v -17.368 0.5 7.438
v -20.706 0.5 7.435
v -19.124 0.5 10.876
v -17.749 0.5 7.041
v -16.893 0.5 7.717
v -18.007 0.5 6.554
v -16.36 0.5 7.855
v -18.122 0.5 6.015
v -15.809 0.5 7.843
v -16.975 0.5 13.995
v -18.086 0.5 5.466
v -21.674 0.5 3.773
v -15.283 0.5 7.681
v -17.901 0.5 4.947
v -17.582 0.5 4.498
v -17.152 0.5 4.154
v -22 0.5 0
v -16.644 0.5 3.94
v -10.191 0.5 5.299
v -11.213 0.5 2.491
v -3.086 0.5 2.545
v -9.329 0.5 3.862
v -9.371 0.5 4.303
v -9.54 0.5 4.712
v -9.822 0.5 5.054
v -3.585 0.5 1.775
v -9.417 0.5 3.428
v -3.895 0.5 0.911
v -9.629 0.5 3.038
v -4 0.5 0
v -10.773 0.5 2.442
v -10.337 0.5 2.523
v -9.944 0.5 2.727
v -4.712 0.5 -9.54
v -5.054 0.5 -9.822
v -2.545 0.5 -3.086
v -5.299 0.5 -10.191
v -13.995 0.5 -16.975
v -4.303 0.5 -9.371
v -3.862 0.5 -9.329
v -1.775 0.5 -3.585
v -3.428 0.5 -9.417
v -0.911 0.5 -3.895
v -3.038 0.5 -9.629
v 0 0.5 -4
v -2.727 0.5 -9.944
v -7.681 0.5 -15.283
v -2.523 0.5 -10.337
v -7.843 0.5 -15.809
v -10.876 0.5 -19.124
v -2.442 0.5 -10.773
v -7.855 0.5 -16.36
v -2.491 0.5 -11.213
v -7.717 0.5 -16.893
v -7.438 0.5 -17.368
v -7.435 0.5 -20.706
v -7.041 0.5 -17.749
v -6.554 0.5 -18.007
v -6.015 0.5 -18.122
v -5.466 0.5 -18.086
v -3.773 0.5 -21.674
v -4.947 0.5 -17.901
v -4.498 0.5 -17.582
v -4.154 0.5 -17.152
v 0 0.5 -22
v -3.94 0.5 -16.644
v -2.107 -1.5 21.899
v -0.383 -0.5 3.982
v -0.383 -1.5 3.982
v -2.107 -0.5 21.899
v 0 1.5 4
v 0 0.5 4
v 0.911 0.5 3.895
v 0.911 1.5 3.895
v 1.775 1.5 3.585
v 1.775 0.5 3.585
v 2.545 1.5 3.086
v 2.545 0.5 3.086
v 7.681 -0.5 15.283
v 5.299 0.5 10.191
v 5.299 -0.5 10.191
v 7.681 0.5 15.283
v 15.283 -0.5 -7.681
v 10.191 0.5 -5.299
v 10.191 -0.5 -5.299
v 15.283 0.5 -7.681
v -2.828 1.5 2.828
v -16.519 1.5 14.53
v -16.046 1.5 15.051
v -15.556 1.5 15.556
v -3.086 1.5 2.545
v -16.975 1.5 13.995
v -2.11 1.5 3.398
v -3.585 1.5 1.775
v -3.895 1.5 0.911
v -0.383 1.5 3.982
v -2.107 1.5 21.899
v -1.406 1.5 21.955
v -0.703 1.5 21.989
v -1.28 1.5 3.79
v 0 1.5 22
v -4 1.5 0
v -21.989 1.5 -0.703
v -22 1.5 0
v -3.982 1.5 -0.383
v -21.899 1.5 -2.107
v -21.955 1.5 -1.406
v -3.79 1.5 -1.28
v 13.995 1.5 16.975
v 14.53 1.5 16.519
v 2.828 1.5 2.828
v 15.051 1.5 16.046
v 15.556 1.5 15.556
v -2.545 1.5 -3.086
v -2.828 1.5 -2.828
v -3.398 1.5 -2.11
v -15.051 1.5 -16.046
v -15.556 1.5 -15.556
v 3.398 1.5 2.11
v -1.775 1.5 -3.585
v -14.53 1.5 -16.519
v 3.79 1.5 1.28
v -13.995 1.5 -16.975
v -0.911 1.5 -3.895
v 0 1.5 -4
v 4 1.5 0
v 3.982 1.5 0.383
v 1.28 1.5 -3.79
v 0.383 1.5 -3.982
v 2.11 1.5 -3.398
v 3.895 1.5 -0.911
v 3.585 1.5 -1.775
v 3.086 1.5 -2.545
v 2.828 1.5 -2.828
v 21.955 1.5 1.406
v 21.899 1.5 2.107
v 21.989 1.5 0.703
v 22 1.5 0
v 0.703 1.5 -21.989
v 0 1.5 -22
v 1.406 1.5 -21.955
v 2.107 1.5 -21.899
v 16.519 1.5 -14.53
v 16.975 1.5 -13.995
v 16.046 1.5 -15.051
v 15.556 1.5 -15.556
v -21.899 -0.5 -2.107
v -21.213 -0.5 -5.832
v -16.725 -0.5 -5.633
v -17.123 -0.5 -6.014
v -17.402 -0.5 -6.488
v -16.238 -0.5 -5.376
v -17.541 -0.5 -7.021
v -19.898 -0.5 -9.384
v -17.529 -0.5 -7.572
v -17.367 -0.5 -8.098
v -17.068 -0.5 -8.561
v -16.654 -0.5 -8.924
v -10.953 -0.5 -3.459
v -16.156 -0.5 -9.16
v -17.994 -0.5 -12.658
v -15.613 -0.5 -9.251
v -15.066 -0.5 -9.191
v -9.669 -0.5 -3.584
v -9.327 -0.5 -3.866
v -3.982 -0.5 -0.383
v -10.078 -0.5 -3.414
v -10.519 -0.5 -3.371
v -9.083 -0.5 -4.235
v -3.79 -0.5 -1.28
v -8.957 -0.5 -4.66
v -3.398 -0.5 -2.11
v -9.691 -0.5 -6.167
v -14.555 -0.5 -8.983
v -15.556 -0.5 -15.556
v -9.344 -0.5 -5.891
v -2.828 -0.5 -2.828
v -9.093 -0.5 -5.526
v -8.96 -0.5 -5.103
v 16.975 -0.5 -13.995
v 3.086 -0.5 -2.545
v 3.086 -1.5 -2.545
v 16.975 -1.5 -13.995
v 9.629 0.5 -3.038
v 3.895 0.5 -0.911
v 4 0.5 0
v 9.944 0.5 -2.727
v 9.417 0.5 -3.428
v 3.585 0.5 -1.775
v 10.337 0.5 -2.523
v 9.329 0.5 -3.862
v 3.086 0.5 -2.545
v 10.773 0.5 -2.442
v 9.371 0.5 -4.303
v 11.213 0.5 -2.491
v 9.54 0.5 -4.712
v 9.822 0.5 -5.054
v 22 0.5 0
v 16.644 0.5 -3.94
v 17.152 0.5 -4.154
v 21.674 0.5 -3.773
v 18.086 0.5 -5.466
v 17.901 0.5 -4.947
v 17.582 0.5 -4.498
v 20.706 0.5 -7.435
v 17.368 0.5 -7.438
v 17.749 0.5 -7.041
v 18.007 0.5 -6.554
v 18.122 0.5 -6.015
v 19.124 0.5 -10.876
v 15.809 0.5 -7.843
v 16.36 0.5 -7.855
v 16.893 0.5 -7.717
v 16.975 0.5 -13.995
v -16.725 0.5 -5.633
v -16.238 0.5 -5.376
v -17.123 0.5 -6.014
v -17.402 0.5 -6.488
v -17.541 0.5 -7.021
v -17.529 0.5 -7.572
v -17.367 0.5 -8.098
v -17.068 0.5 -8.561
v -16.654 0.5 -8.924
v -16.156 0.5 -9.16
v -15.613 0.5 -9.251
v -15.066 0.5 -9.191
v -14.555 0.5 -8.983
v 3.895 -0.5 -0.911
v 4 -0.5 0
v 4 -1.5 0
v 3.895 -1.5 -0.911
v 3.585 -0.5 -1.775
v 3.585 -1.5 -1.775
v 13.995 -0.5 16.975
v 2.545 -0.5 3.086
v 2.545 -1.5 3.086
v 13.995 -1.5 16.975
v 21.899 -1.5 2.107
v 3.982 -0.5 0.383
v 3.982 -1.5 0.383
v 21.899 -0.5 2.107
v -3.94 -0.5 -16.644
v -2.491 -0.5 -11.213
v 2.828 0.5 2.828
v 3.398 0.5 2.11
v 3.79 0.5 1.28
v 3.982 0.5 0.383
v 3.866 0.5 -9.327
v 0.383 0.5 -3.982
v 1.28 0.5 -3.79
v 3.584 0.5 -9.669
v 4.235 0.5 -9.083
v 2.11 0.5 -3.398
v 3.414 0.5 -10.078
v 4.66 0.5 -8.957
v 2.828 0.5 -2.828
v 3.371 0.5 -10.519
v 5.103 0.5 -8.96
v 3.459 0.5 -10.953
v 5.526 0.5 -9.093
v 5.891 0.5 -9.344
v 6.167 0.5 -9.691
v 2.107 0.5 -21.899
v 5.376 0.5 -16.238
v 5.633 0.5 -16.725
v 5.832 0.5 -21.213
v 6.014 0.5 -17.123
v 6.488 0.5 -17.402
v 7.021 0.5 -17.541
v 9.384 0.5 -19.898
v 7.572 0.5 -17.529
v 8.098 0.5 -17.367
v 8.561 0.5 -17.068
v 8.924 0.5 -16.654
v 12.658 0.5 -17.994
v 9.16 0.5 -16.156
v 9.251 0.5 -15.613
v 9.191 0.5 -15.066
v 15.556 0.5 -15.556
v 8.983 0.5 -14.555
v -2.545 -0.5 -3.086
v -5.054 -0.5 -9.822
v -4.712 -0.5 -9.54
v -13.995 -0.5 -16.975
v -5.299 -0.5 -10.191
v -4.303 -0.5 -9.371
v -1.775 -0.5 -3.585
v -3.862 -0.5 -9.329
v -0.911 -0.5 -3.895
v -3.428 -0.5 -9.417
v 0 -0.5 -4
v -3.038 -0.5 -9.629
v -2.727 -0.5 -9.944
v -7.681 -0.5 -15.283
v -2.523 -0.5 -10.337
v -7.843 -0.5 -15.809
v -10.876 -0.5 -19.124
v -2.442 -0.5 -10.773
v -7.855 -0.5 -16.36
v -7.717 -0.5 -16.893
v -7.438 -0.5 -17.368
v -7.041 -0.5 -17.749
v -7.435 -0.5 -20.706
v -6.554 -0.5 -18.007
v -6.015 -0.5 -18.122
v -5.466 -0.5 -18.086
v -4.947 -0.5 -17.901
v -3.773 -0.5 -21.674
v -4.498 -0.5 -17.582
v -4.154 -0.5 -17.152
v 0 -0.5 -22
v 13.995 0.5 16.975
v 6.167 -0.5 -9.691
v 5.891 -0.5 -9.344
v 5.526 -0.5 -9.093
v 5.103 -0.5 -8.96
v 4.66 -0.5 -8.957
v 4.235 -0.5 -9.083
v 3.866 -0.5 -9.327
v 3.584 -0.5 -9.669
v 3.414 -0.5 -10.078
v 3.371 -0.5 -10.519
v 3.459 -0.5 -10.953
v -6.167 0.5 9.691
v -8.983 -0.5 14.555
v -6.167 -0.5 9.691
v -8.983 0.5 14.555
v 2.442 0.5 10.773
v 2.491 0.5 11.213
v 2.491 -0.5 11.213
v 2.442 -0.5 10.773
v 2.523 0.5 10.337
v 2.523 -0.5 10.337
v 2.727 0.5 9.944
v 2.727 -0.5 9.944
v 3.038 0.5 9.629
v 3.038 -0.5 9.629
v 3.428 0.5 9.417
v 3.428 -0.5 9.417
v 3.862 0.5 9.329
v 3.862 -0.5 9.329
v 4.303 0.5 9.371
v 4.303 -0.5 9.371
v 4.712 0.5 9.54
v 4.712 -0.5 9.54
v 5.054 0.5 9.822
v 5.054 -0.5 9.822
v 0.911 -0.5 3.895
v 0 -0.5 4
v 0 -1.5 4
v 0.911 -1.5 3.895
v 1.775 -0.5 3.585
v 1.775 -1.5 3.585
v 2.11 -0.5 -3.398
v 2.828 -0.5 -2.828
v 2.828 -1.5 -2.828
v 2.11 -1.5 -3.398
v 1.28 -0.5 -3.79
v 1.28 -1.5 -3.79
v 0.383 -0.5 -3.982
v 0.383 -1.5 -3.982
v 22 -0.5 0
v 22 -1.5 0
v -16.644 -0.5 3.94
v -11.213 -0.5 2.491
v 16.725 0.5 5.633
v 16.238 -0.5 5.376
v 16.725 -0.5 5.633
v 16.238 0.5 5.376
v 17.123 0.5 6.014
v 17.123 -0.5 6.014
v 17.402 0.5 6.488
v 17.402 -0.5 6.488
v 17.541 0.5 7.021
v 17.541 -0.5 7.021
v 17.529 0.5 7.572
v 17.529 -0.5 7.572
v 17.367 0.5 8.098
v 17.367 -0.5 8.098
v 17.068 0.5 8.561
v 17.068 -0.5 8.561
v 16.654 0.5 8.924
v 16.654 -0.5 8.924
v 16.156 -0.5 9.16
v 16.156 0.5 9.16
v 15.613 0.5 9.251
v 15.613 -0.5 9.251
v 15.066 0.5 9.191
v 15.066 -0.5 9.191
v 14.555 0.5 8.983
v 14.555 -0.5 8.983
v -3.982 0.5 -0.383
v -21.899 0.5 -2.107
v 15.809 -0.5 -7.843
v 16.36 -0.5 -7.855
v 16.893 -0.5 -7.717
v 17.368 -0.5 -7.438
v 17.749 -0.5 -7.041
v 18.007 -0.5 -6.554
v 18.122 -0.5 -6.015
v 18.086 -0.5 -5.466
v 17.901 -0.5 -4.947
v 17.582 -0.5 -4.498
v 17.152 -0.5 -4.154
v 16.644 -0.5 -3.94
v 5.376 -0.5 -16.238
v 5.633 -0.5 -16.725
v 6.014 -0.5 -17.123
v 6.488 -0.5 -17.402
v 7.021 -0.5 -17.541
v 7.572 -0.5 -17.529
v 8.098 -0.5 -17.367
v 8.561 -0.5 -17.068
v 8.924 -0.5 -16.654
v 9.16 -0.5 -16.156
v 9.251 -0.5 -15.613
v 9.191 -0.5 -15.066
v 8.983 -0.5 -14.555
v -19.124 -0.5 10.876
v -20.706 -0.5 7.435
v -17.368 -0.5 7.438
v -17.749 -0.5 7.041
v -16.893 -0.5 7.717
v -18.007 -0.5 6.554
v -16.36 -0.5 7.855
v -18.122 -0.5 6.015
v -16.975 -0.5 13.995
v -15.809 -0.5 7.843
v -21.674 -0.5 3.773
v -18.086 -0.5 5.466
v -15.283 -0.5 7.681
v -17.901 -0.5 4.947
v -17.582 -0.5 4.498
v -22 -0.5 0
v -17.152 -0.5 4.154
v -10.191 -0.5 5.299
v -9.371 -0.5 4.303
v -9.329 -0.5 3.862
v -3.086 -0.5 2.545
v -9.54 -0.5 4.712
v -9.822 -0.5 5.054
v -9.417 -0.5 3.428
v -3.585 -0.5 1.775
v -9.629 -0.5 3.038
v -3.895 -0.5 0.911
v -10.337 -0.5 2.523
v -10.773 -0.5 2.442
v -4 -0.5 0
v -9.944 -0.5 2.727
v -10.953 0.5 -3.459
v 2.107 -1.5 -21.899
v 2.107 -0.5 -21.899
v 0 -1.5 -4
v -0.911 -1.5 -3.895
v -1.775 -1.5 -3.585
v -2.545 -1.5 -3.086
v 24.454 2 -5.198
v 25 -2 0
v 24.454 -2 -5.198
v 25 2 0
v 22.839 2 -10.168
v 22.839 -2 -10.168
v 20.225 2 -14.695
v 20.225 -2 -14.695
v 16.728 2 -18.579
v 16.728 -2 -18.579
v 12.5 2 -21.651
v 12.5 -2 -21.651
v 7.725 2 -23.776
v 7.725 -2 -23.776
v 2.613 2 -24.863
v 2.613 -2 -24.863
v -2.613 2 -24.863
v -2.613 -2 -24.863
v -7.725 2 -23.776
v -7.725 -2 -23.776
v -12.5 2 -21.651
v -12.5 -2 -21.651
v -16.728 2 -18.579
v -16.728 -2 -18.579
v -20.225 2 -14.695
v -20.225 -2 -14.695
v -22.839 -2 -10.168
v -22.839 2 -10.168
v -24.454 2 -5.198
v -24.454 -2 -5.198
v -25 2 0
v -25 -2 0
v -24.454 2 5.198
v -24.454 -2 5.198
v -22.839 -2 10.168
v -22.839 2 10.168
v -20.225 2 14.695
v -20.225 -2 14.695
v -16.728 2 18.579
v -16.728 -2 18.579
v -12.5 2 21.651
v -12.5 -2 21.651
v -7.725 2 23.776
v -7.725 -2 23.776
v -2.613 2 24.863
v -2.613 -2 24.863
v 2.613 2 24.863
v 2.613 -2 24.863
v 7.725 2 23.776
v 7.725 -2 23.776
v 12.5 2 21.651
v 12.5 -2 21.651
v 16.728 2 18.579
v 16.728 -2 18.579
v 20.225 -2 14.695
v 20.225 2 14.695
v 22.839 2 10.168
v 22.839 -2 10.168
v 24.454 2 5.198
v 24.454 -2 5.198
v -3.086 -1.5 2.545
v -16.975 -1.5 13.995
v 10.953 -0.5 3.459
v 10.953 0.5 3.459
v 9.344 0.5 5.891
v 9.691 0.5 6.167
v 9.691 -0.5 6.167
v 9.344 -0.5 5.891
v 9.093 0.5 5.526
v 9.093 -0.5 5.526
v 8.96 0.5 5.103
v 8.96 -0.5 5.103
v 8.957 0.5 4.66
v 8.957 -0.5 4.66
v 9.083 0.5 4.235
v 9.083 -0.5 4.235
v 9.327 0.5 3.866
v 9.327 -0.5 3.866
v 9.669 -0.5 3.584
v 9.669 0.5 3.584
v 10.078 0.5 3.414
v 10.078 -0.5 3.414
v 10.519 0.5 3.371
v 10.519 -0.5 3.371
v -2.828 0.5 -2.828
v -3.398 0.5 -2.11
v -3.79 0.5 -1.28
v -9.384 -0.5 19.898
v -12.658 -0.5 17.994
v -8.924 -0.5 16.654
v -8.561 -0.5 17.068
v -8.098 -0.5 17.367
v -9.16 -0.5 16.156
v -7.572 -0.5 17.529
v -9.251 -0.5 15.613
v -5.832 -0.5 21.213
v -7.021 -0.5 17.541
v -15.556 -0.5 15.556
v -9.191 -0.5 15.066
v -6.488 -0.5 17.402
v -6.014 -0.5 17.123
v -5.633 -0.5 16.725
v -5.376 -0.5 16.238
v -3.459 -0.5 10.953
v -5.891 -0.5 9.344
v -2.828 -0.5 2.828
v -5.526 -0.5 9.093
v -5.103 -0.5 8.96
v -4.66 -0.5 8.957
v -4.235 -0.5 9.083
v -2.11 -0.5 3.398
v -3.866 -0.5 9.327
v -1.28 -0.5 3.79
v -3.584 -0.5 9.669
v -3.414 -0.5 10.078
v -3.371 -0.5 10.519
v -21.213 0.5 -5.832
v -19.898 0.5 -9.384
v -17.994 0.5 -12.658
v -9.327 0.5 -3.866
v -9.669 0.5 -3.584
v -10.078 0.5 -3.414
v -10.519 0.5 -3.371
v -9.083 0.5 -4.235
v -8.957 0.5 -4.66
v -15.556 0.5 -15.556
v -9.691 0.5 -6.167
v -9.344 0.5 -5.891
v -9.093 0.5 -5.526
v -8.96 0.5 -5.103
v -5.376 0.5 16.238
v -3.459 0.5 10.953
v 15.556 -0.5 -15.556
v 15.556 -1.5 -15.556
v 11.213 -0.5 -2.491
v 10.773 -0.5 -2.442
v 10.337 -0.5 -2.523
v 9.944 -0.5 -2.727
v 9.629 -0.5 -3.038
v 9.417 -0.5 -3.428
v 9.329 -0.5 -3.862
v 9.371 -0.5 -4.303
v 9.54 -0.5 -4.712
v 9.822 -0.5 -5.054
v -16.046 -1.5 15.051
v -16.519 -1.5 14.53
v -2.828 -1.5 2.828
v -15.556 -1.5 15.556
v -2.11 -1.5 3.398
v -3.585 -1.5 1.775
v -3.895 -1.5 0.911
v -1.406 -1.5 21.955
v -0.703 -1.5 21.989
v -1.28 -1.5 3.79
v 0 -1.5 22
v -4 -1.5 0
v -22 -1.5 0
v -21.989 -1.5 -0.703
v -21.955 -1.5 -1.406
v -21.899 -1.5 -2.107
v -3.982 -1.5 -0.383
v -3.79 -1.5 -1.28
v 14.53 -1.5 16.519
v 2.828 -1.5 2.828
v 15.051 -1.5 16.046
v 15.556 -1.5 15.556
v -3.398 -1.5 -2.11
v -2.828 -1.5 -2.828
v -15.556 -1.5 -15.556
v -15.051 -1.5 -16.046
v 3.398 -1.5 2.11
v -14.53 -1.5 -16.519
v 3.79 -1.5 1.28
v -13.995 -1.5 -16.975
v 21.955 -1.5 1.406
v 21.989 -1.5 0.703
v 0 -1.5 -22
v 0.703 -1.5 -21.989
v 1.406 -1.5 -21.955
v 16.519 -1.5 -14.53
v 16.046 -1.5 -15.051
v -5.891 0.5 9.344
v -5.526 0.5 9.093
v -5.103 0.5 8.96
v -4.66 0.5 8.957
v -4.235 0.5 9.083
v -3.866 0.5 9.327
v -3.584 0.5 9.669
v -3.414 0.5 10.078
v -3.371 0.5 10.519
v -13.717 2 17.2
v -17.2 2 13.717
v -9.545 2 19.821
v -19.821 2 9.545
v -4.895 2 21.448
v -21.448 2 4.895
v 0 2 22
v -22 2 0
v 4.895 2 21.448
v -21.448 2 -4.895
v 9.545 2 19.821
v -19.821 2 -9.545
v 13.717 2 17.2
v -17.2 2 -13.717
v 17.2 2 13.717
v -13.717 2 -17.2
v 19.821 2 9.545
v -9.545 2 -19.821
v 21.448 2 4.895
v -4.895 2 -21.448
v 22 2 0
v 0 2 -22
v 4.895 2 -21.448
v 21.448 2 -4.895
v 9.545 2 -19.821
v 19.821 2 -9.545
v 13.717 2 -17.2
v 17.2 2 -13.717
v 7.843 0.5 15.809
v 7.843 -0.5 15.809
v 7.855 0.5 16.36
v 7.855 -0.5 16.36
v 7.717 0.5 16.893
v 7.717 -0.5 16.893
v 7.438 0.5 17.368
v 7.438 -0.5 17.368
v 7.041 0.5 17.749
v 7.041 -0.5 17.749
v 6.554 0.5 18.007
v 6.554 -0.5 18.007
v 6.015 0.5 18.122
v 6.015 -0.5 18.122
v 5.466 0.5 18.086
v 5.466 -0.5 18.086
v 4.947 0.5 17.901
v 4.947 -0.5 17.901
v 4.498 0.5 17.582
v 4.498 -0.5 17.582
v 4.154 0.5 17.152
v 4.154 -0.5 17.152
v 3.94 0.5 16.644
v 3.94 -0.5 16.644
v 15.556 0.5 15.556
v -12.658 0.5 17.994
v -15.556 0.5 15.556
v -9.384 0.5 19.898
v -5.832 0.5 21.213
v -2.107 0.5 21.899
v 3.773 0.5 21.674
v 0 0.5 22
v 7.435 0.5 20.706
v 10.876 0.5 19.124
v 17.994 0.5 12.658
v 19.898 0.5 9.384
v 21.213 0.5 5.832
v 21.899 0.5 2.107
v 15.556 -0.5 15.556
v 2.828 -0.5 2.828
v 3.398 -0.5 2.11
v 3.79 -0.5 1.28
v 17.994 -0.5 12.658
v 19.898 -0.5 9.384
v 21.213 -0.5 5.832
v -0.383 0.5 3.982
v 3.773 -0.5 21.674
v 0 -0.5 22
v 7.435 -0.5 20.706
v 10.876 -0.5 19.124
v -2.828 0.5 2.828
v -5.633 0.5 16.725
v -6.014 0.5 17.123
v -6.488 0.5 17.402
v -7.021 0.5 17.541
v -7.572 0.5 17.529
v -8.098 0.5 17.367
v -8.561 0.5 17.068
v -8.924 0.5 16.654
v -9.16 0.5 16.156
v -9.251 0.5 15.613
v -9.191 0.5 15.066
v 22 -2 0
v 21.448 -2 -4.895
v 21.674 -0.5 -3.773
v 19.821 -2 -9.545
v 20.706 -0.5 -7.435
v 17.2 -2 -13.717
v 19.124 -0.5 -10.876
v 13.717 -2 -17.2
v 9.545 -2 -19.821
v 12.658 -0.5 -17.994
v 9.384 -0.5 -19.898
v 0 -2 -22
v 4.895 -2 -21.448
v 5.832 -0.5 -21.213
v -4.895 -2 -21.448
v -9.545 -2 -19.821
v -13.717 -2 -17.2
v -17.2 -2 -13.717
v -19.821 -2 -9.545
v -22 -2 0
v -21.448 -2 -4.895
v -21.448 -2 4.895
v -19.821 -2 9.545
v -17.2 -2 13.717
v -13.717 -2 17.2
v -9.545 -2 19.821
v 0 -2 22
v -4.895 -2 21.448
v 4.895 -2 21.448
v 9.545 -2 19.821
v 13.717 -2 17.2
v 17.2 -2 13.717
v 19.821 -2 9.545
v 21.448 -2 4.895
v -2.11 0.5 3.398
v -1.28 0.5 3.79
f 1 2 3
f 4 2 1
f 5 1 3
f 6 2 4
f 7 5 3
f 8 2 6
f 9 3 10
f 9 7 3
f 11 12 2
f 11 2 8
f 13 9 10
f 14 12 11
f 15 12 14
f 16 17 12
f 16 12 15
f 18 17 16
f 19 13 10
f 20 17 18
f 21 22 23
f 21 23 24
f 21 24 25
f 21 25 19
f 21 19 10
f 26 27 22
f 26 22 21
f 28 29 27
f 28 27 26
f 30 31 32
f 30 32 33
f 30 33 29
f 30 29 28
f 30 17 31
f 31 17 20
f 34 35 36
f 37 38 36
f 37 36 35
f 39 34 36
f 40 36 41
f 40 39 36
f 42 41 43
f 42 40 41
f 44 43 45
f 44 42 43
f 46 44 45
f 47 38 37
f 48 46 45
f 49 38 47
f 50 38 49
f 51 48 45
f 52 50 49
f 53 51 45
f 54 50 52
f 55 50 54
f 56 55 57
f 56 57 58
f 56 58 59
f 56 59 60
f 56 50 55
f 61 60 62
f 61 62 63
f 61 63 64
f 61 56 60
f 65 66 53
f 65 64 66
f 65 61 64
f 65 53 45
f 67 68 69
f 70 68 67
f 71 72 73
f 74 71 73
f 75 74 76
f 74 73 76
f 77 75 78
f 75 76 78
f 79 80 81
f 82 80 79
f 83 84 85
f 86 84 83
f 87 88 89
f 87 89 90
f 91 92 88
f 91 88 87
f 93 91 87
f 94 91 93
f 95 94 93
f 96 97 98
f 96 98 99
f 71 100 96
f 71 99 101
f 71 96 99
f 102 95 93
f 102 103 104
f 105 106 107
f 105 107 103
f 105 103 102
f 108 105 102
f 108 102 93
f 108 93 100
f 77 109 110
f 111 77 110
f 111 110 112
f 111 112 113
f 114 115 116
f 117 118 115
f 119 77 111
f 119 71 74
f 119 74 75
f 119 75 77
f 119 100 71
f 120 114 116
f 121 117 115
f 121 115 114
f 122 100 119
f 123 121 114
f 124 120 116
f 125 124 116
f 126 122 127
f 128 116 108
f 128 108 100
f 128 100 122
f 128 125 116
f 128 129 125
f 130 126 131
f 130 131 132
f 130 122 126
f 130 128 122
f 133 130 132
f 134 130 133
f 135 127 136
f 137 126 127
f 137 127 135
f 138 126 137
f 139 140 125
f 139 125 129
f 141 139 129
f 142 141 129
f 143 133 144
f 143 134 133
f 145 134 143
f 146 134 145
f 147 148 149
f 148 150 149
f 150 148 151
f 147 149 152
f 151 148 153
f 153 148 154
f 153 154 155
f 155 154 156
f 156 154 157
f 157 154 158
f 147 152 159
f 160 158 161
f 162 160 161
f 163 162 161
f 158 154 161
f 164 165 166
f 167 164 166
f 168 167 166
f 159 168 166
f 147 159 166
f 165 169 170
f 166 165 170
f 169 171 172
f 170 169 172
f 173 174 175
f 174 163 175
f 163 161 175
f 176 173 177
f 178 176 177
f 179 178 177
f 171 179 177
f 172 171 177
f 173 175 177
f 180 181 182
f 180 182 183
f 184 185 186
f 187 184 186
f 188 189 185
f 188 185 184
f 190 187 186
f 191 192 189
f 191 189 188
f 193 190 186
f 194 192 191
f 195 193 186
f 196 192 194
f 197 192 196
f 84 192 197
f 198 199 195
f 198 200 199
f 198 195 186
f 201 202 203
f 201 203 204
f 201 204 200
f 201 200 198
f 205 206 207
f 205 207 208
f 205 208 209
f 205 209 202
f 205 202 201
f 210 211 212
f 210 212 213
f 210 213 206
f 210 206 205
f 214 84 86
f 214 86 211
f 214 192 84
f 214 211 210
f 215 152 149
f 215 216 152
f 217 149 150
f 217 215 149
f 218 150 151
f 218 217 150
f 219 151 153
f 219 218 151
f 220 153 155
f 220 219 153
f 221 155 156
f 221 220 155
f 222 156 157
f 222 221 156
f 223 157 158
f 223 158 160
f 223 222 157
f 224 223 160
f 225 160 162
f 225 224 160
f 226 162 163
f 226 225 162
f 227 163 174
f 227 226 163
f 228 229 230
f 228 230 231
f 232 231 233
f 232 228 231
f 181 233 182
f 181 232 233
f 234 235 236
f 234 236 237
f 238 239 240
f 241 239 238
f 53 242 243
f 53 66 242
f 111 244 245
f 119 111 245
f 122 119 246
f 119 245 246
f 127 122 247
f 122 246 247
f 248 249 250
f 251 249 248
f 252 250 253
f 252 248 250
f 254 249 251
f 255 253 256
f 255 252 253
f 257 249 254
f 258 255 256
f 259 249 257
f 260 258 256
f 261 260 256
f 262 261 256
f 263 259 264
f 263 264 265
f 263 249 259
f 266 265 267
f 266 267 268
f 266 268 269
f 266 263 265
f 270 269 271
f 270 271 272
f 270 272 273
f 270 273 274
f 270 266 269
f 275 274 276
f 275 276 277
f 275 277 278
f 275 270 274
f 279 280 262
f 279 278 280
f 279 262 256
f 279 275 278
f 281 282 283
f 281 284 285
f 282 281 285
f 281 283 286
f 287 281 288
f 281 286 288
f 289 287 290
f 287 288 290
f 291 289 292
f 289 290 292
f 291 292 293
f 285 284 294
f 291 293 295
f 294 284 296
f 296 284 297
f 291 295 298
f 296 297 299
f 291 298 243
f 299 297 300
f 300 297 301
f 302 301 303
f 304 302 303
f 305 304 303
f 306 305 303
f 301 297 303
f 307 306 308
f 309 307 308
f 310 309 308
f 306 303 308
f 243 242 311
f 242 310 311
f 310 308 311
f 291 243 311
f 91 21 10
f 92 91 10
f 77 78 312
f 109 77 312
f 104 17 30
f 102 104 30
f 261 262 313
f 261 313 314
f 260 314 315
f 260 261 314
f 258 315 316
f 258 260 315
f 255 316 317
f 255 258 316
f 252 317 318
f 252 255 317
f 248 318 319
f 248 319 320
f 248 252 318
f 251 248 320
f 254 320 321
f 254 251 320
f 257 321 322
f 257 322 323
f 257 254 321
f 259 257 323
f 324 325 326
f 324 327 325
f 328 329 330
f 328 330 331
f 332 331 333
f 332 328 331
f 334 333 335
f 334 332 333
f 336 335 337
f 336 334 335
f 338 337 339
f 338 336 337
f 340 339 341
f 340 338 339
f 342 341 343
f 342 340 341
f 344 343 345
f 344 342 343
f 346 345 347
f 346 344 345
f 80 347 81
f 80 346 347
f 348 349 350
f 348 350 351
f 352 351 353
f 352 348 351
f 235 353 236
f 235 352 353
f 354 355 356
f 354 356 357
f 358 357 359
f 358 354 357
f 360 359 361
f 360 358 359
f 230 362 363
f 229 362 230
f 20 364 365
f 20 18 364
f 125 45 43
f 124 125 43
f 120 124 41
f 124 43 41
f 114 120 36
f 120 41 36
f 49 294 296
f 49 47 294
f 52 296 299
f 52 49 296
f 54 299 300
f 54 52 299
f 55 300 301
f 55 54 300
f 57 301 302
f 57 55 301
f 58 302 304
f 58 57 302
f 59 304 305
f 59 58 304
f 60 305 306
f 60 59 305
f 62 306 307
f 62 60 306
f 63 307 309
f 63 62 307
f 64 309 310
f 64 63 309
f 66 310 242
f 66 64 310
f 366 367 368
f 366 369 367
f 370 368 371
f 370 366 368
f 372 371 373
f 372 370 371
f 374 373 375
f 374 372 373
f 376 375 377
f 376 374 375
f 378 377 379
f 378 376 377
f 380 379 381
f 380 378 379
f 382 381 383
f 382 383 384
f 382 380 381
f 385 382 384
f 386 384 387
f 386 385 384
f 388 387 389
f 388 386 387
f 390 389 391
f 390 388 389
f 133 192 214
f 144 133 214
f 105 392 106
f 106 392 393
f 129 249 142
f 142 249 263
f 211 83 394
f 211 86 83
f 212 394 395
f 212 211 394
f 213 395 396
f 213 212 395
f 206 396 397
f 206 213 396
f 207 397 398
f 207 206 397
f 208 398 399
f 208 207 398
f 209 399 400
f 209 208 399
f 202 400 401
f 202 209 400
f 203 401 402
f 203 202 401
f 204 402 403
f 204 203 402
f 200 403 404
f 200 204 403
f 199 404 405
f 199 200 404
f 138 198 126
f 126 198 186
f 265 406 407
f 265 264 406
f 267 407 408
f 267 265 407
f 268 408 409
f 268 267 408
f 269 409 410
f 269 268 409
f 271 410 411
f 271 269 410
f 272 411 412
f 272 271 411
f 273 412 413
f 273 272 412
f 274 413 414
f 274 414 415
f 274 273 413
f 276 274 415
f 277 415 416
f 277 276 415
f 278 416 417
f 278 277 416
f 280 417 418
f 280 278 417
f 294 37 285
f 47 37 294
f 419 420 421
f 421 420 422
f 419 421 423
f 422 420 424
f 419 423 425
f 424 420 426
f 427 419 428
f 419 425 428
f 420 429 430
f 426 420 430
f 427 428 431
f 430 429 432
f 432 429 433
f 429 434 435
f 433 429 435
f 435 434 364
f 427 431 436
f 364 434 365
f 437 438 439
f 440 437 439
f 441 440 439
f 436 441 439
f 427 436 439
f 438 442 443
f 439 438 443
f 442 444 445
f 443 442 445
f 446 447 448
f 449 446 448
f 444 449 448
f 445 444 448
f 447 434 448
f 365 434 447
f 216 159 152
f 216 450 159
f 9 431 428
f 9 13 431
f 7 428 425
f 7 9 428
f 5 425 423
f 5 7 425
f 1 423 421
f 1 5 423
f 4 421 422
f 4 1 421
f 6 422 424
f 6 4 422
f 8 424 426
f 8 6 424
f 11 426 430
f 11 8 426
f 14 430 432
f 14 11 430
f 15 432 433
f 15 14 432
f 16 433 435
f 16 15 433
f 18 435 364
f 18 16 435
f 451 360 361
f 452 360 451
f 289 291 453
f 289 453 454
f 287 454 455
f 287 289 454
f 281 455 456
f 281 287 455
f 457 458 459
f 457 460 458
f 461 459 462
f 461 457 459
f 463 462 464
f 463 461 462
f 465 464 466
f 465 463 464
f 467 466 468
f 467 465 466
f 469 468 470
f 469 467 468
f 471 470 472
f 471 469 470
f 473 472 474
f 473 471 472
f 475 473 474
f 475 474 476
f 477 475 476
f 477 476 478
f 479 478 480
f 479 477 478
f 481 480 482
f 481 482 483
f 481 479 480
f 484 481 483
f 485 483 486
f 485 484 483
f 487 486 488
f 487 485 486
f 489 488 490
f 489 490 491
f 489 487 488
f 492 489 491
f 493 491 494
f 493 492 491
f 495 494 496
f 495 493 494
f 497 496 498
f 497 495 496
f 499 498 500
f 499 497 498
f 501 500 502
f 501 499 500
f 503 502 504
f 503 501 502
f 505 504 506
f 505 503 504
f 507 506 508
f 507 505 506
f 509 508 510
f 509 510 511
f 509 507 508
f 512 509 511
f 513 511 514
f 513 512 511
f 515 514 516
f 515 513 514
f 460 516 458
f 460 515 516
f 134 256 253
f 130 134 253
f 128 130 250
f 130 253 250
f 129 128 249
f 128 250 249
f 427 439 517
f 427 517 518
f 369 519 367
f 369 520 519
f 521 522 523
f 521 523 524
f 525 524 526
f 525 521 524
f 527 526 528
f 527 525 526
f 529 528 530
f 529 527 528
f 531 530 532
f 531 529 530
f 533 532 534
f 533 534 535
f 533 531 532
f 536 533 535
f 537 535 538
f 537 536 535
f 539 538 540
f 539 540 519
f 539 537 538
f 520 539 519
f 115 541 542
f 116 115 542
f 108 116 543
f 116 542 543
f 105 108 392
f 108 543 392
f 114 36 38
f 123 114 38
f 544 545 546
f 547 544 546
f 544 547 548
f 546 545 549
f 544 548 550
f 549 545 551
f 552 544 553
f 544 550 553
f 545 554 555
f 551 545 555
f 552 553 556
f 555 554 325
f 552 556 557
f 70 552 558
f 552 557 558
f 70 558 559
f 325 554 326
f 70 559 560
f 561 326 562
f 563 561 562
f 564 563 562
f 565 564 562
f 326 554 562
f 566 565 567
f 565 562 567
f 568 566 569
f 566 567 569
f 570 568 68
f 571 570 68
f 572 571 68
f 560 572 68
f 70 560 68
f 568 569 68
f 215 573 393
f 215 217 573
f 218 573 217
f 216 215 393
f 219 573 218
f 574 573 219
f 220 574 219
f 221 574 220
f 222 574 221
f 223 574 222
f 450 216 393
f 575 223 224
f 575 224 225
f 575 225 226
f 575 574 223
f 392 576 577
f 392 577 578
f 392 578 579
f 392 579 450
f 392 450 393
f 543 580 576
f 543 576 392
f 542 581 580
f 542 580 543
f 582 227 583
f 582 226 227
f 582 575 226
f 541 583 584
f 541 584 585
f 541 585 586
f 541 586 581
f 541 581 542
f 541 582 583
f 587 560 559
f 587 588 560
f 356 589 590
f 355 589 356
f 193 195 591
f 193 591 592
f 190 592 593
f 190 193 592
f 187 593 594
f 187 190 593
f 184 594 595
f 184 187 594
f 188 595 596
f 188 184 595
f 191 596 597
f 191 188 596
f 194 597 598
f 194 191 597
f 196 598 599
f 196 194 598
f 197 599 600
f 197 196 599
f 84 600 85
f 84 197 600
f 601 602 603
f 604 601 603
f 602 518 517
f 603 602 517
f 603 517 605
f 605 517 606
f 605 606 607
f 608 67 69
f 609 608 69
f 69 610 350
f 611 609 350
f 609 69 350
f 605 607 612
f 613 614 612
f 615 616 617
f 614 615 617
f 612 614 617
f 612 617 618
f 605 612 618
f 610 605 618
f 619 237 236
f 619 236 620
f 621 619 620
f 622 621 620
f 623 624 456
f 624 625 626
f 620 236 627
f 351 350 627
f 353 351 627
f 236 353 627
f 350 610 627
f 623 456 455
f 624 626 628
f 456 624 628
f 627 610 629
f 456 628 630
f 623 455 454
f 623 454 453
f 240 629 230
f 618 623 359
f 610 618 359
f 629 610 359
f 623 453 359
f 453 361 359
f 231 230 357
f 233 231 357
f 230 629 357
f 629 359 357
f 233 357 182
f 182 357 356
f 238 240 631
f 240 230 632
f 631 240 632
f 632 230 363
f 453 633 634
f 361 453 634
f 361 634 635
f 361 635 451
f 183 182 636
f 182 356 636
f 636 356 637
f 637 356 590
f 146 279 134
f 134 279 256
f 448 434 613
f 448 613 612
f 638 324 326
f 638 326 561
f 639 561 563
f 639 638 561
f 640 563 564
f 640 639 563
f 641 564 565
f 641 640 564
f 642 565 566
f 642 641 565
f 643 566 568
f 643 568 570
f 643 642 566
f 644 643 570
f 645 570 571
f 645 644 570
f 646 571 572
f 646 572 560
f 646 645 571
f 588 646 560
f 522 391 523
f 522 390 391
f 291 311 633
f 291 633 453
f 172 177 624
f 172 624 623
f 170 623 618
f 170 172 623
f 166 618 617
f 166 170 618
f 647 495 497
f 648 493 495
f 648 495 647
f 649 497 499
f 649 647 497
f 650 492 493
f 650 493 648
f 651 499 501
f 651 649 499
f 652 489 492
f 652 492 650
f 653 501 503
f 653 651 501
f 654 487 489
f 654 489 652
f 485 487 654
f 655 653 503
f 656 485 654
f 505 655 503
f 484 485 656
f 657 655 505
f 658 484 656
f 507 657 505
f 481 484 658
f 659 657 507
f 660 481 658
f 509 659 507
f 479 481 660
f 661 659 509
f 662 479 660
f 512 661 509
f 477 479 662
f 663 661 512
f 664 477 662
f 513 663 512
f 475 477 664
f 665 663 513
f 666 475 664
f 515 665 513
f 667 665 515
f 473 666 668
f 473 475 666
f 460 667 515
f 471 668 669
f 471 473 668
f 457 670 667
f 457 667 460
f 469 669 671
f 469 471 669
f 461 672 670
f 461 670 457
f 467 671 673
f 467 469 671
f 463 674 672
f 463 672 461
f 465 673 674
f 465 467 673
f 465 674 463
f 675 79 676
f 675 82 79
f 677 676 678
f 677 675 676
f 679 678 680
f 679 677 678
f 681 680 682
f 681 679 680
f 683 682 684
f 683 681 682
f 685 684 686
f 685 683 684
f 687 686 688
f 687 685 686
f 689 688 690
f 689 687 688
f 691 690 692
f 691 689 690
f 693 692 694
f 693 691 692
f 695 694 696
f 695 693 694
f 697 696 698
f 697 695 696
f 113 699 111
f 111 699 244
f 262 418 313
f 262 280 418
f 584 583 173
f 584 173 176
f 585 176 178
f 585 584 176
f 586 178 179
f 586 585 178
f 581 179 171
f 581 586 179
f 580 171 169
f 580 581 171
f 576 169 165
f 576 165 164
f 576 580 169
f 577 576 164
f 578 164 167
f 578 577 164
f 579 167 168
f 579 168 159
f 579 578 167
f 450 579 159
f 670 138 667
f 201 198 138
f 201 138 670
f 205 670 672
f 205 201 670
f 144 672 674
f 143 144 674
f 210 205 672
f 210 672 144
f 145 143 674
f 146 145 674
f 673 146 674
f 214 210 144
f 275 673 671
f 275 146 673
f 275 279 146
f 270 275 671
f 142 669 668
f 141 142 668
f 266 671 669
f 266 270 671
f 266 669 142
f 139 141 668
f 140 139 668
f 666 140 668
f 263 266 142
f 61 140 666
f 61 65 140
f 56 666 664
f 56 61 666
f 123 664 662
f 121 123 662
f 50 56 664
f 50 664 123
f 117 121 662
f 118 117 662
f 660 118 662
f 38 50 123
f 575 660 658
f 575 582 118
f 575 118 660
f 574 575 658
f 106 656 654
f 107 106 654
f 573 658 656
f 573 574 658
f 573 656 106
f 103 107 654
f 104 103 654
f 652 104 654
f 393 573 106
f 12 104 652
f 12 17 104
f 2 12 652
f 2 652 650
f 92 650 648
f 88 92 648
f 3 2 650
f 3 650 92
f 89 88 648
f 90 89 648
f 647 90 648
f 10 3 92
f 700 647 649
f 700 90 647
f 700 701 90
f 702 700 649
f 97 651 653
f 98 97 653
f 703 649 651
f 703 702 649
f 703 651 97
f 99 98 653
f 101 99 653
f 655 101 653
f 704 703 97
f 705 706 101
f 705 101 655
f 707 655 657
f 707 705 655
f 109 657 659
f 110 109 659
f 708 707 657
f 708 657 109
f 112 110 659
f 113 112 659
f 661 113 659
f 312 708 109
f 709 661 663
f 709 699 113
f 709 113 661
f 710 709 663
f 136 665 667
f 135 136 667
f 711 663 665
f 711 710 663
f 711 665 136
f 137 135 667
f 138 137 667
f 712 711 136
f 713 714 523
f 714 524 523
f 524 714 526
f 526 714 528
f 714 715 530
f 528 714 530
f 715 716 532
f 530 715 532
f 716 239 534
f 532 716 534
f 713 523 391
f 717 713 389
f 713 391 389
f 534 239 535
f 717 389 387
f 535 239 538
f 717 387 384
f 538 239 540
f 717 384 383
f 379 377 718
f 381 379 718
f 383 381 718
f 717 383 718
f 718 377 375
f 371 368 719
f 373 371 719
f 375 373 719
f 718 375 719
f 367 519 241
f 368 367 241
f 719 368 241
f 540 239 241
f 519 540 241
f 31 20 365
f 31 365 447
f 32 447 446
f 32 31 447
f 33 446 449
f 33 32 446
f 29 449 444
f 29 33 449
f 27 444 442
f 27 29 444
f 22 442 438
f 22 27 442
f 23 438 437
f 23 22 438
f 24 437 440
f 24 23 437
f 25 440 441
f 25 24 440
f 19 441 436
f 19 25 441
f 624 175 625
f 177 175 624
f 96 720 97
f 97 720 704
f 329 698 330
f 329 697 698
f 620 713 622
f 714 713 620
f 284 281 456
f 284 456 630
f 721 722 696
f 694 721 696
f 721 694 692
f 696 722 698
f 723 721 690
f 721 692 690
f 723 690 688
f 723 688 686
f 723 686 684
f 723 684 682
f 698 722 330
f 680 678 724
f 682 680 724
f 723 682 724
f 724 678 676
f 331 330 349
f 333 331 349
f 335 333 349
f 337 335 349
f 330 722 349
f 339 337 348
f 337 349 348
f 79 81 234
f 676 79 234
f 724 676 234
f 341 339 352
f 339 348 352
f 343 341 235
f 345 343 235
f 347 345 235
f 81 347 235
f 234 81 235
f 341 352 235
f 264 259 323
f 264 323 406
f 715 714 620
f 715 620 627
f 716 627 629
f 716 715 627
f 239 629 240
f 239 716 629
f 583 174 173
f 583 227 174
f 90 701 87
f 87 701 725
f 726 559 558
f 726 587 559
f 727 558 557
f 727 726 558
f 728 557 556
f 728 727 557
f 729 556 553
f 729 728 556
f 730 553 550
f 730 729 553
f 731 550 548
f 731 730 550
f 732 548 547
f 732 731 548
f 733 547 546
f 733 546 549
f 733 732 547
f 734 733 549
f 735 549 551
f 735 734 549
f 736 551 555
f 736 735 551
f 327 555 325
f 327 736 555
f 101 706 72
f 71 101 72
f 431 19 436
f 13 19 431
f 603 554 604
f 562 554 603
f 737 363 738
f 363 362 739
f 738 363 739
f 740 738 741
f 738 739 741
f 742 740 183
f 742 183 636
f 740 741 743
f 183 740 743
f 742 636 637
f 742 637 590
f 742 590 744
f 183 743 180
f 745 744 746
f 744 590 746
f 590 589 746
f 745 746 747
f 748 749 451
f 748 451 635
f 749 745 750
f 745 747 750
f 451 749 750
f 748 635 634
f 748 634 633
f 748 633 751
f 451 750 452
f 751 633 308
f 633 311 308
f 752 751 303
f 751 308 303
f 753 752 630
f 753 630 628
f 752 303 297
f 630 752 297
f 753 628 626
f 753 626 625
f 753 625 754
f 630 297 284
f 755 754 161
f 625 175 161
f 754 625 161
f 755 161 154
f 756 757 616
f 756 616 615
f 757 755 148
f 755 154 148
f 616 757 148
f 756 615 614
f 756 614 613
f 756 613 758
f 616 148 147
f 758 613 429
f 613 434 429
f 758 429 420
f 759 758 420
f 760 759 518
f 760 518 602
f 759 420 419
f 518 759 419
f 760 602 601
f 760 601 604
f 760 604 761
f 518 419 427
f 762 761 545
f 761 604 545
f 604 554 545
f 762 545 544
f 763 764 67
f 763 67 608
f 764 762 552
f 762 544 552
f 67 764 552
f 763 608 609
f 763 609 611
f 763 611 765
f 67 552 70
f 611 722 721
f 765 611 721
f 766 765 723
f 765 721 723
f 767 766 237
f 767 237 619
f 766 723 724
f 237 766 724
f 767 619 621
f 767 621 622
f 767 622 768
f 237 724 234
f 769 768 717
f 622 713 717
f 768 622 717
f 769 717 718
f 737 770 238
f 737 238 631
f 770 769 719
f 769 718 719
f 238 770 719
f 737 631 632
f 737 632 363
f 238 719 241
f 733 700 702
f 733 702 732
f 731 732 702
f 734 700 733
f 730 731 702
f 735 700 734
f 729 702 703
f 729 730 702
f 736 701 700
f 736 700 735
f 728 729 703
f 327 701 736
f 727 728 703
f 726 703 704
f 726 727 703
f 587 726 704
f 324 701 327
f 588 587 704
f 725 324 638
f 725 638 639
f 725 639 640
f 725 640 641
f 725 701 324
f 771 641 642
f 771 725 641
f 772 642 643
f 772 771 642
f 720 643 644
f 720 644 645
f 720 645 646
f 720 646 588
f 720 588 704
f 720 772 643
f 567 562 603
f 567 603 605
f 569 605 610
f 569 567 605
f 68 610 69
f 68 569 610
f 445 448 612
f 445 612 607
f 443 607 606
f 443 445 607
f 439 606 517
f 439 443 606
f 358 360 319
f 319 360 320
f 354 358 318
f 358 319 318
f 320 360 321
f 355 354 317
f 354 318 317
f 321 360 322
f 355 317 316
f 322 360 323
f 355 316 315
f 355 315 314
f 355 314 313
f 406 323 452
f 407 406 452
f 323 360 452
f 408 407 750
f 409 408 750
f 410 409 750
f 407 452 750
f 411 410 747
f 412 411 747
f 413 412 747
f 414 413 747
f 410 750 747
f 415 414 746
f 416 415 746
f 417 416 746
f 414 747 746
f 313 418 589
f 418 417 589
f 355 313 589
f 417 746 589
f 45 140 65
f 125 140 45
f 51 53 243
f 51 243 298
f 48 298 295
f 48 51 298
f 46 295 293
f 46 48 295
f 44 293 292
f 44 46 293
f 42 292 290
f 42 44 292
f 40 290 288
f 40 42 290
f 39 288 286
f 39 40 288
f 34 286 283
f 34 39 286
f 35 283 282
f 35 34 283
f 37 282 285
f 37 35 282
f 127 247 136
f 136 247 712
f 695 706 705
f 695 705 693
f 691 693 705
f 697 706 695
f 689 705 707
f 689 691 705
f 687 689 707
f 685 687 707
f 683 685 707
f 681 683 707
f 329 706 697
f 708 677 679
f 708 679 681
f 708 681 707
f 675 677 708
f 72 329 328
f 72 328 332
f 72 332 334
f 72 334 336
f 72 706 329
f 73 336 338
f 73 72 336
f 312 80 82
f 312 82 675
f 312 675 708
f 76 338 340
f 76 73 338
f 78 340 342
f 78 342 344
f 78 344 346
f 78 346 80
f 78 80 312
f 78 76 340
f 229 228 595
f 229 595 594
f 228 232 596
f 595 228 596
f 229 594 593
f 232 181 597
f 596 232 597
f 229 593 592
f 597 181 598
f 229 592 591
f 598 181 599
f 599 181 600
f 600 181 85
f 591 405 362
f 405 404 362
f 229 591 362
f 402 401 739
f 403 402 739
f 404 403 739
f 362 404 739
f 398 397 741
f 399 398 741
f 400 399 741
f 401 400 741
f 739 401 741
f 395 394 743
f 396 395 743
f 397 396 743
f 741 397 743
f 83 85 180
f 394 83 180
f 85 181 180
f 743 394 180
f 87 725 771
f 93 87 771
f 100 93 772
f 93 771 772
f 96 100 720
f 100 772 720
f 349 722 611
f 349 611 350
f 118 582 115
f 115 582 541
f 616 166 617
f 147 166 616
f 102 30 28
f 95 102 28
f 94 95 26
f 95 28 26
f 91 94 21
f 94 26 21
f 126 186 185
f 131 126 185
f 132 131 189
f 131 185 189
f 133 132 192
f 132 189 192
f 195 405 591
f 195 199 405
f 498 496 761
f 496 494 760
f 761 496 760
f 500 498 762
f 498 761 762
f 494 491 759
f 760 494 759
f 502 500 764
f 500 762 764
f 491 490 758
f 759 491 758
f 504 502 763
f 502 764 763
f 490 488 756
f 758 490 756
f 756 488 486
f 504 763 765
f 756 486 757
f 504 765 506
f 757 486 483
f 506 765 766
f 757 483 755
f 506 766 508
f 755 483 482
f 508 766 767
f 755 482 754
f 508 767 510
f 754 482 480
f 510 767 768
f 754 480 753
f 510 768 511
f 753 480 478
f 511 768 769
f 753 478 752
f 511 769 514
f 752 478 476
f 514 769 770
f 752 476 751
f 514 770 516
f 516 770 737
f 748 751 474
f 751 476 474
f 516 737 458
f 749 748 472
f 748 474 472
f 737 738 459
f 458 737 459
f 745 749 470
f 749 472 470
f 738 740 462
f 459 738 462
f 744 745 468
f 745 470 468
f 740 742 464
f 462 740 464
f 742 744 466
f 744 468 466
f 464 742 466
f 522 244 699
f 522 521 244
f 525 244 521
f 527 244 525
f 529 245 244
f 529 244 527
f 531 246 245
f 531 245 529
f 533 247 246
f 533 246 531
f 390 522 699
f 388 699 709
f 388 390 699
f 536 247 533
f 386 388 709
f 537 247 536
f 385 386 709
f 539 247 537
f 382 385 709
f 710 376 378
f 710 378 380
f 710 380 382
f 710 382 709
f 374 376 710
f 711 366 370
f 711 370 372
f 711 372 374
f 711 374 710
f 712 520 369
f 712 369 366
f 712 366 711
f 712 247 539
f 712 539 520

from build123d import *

# Parameters (mm, degrees)
BOSS_EXTRUDE2_DEPTH      = 2
BOSS_EXTRUDE2_DEPTH_BACK = 2
SKETCH1_R                = 25
SKETCH1_R_2              = 22
BOSS_EXTRUDE3_DEPTH      = 1.5
BOSS_EXTRUDE3_DEPTH_BACK = 1.5
BOSS_EXTRUDE5_DEPTH      = 0.5
BOSS_EXTRUDE5_DEPTH_BACK = 0.5


with BuildPart() as part:
    # Sketch1 → Boss-Extrude2 (new, two sides: drawn at the far end of the back side and taken through both)
    with BuildSketch(Plane(origin=(0, 0, 0), x_dir=(1, 0, 0), z_dir=(0, 1, 0)).offset(-BOSS_EXTRUDE2_DEPTH_BACK)):
        Circle(SKETCH1_R)
        Circle(SKETCH1_R_2, mode=Mode.SUBTRACT)
    extrude(amount=BOSS_EXTRUDE2_DEPTH + BOSS_EXTRUDE2_DEPTH_BACK)

    # Sketch1<5> → Boss-Extrude3 (add, two sides: drawn at the far end of the back side and taken through both)
    with BuildSketch(Plane(origin=(0, 0, 0), x_dir=(1, 0, 0), z_dir=(0, 1, 0)).offset(-BOSS_EXTRUDE3_DEPTH_BACK)):
        with BuildLine():
            Line((0, 22), (0, 4))
            ThreePointArc((0, 4), (-1.351805959, 3.764654121), (-2.544540937, 3.086310325))
            Line((-2.544540937, 3.086310325), (-13.994975151, 16.974706787))
            ThreePointArc((-13.994975151, 16.974706787), (-14.792671398, 16.284252298), (-15.556349186, 15.556349186))
            Line((-15.556349186, 15.556349186), (-2.828427125, 2.828427125))
            ThreePointArc((-2.828427125, 2.828427125), (-3.617883618, 1.706141297), (-3.981613111, 0.383088808))
            Line((-3.981613111, 0.383088808), (-21.89887211, 2.106988446))
            ThreePointArc((-21.89887211, 2.106988446), (-21.974703484, 1.054706969), (-22, 0))
            Line((-22, 0), (-4, 0))
            ThreePointArc((-4, 0), (-3.764654121, -1.351805959), (-3.086310325, -2.544540937))
            Line((-3.086310325, -2.544540937), (-16.974706787, -13.994975151))
            ThreePointArc((-16.974706787, -13.994975151), (-16.284252298, -14.792671398), (-15.556349186, -15.556349186))
            Line((-15.556349186, -15.556349186), (-2.828427125, -2.828427125))
            ThreePointArc((-2.828427125, -2.828427125), (-1.706141297, -3.617883618), (-0.383088808, -3.981613111))
            Line((-0.383088808, -3.981613111), (-2.106988446, -21.89887211))
            ThreePointArc((-2.106988446, -21.89887211), (-1.054706969, -21.974703484), (0, -22))
            Line((0, -22), (0, -4))
            ThreePointArc((0, -4), (1.351805959, -3.764654121), (2.544540937, -3.086310325))
            Line((2.544540937, -3.086310325), (13.994975151, -16.974706787))
            ThreePointArc((13.994975151, -16.974706787), (14.792671398, -16.284252298), (15.556349186, -15.556349186))
            Line((15.556349186, -15.556349186), (2.828427125, -2.828427125))
            ThreePointArc((2.828427125, -2.828427125), (3.617883618, -1.706141297), (3.981613111, -0.383088808))
            Line((3.981613111, -0.383088808), (21.89887211, -2.106988446))
            ThreePointArc((21.89887211, -2.106988446), (21.974703484, -1.054706969), (22, 0))
            Line((22, 0), (4, 0))
            ThreePointArc((4, 0), (3.764654121, 1.351805959), (3.086310325, 2.544540937))
            Line((3.086310325, 2.544540937), (16.974706787, 13.994975151))
            ThreePointArc((16.974706787, 13.994975151), (16.284252298, 14.792671398), (15.556349186, 15.556349186))
            Line((15.556349186, 15.556349186), (2.828427125, 2.828427125))
            ThreePointArc((2.828427125, 2.828427125), (1.706141297, 3.617883618), (0.383088808, 3.981613111))
            Line((0.383088808, 3.981613111), (2.106988446, 21.89887211))
            ThreePointArc((2.106988446, 21.89887211), (1.054706969, 21.974703484), (0, 22))
        make_face()
    extrude(amount=BOSS_EXTRUDE3_DEPTH + BOSS_EXTRUDE3_DEPTH_BACK)

    # Sketch1<7> → Boss-Extrude5 (add, two sides: drawn at the far end of the back side and taken through both)
    # profile 1 of 8: a face of its own
    with BuildSketch(Plane(origin=(0, 0, 0), x_dir=(1, 0, 0), z_dir=(0, 1, 0)).offset(-BOSS_EXTRUDE5_DEPTH_BACK)):
        with BuildLine():
            ThreePointArc((-2.544540937, 3.086310325), (-1.351805959, 3.764654121), (0, 4))
            Line((0, 4), (0, 22))
            ThreePointArc((0, 22), (-7.434932773, 20.705597665), (-13.994975151, 16.974706787))
            Line((-13.994975151, 16.974706787), (-2.544540937, 3.086310325))
        make_face()
        with BuildLine():
            ThreePointArc((-2.491260012, 11.213267971), (-3.427551917, 9.417121496), (-5.299333827, 10.191212687))
            Line((-5.299333827, 10.191212687), (-7.680574112, 15.28292057))
            ThreePointArc((-7.680574112, 15.28292057), (-6.554010177, 18.006994968), (-3.940010864, 16.644374252))
            Line((-3.940010864, 16.644374252), (-2.491260012, 11.213267971))
        make_face(mode=Mode.SUBTRACT)
    # profile 2 of 8: a face of its own
    with BuildSketch(Plane(origin=(0, 0, 0), x_dir=(1, 0, 0), z_dir=(0, 1, 0)).offset(-BOSS_EXTRUDE5_DEPTH_BACK)):
        with BuildLine():
            Line((2.106988446, 21.89887211), (0.383088808, 3.981613111))
            ThreePointArc((0.383088808, 3.981613111), (1.706141297, 3.617883618), (2.828427125, 2.828427125))
            Line((2.828427125, 2.828427125), (15.556349186, 15.556349186))
            ThreePointArc((15.556349186, 15.556349186), (9.383777136, 19.898359899), (2.106988446, 21.89887211))
        make_face()
        with BuildLine():
            ThreePointArc((6.167390973, 9.69056467), (4.235265266, 9.082555673), (3.459080714, 10.953470484))
            Line((3.459080714, 10.953470484), (5.375670734, 16.237642809))
            ThreePointArc((5.375670734, 16.237642809), (8.098483211, 17.367253291), (8.983341502, 14.555358302))
            Line((8.983341502, 14.555358302), (6.167390973, 9.69056467))
        make_face(mode=Mode.SUBTRACT)
    # profile 3 of 8: a face of its own
    with BuildSketch(Plane(origin=(0, 0, 0), x_dir=(1, 0, 0), z_dir=(0, 1, 0)).offset(-BOSS_EXTRUDE5_DEPTH_BACK)):
        with BuildLine():
            ThreePointArc((-3.981613111, 0.383088808), (-3.617883618, 1.706141297), (-2.828427125, 2.828427125))
            Line((-2.828427125, 2.828427125), (-15.556349186, 15.556349186))
            ThreePointArc((-15.556349186, 15.556349186), (-19.898359899, 9.383777136), (-21.89887211, 2.106988446))
            Line((-21.89887211, 2.106988446), (-3.981613111, 0.383088808))
        make_face()
        with BuildLine():
            ThreePointArc((-9.69056467, 6.167390973), (-9.082555673, 4.235265266), (-10.953470484, 3.459080714))
            Line((-10.953470484, 3.459080714), (-16.237642809, 5.375670734))
            ThreePointArc((-16.237642809, 5.375670734), (-17.367253291, 8.098483211), (-14.555358302, 8.983341502))
            Line((-14.555358302, 8.983341502), (-9.69056467, 6.167390973))
        make_face(mode=Mode.SUBTRACT)
    # profile 4 of 8: a face of its own
    with BuildSketch(Plane(origin=(0, 0, 0), x_dir=(1, 0, 0), z_dir=(0, 1, 0)).offset(-BOSS_EXTRUDE5_DEPTH_BACK)):
        with BuildLine():
            Line((16.974706787, 13.994975151), (3.086310325, 2.544540937))
            ThreePointArc((3.086310325, 2.544540937), (3.764654121, 1.351805959), (4, 0))
            Line((4, 0), (22, 0))
            ThreePointArc((22, 0), (20.705597665, 7.434932773), (16.974706787, 13.994975151))
        make_face()
        with BuildLine():
            ThreePointArc((11.213267971, 2.491260012), (9.417121496, 3.427551917), (10.191212687, 5.299333827))
            Line((10.191212687, 5.299333827), (15.28292057, 7.680574112))
            ThreePointArc((15.28292057, 7.680574112), (18.006994968, 6.554010177), (16.644374252, 3.940010864))
            Line((16.644374252, 3.940010864), (11.213267971, 2.491260012))
        make_face(mode=Mode.SUBTRACT)
    # profile 5 of 8: a face of its own
    with BuildSketch(Plane(origin=(0, 0, 0), x_dir=(1, 0, 0), z_dir=(0, 1, 0)).offset(-BOSS_EXTRUDE5_DEPTH_BACK)):
        with BuildLine():
            ThreePointArc((-3.086310325, -2.544540937), (-3.764654121, -1.351805959), (-4, 0))
            Line((-4, 0), (-22, 0))
            ThreePointArc((-22, 0), (-20.705597665, -7.434932773), (-16.974706787, -13.994975151))
            Line((-16.974706787, -13.994975151), (-3.086310325, -2.544540937))
        make_face()
        with BuildLine():
            ThreePointArc((-11.213267971, -2.491260012), (-9.417121496, -3.427551917), (-10.191212687, -5.299333827))
            Line((-10.191212687, -5.299333827), (-15.28292057, -7.680574112))
            ThreePointArc((-15.28292057, -7.680574112), (-18.006994968, -6.554010177), (-16.644374252, -3.940010864))
            Line((-16.644374252, -3.940010864), (-11.213267971, -2.491260012))
        make_face(mode=Mode.SUBTRACT)
    # profile 6 of 8: a face of its own
    with BuildSketch(Plane(origin=(0, 0, 0), x_dir=(1, 0, 0), z_dir=(0, 1, 0)).offset(-BOSS_EXTRUDE5_DEPTH_BACK)):
        with BuildLine():
            Line((21.89887211, -2.106988446), (3.981613111, -0.383088808))
            ThreePointArc((3.981613111, -0.383088808), (3.617883618, -1.706141297), (2.828427125, -2.828427125))
            Line((2.828427125, -2.828427125), (15.556349186, -15.556349186))
            ThreePointArc((15.556349186, -15.556349186), (19.898359899, -9.383777136), (21.89887211, -2.106988446))
        make_face()
        with BuildLine():
            ThreePointArc((9.69056467, -6.167390973), (9.082555673, -4.235265266), (10.953470484, -3.459080714))
            Line((10.953470484, -3.459080714), (16.237642809, -5.375670734))
            ThreePointArc((16.237642809, -5.375670734), (17.367253291, -8.098483211), (14.555358302, -8.983341502))
            Line((14.555358302, -8.983341502), (9.69056467, -6.167390973))
        make_face(mode=Mode.SUBTRACT)
    # profile 7 of 8: a face of its own
    with BuildSketch(Plane(origin=(0, 0, 0), x_dir=(1, 0, 0), z_dir=(0, 1, 0)).offset(-BOSS_EXTRUDE5_DEPTH_BACK)):
        with BuildLine():
            ThreePointArc((-0.383088808, -3.981613111), (-1.706141297, -3.617883618), (-2.828427125, -2.828427125))
            Line((-2.828427125, -2.828427125), (-15.556349186, -15.556349186))
            ThreePointArc((-15.556349186, -15.556349186), (-9.383777136, -19.898359899), (-2.106988446, -21.89887211))
            Line((-2.106988446, -21.89887211), (-0.383088808, -3.981613111))
        make_face()
        with BuildLine():
            ThreePointArc((-6.167390973, -9.69056467), (-4.235265266, -9.082555673), (-3.459080714, -10.953470484))
            Line((-3.459080714, -10.953470484), (-5.375670734, -16.237642809))
            ThreePointArc((-5.375670734, -16.237642809), (-8.098483211, -17.367253291), (-8.983341502, -14.555358302))
            Line((-8.983341502, -14.555358302), (-6.167390973, -9.69056467))
        make_face(mode=Mode.SUBTRACT)
    # profile 8 of 8: a face of its own
    with BuildSketch(Plane(origin=(0, 0, 0), x_dir=(1, 0, 0), z_dir=(0, 1, 0)).offset(-BOSS_EXTRUDE5_DEPTH_BACK)):
        with BuildLine():
            Line((13.994975151, -16.974706787), (2.544540937, -3.086310325))
            ThreePointArc((2.544540937, -3.086310325), (1.351805959, -3.764654121), (0, -4))
            Line((0, -4), (0, -22))
            ThreePointArc((0, -22), (7.434932773, -20.705597665), (13.994975151, -16.974706787))
        make_face()
        with BuildLine():
            ThreePointArc((2.491260012, -11.213267971), (3.427551917, -9.417121496), (5.299333827, -10.191212687))
            Line((5.299333827, -10.191212687), (7.680574112, -15.28292057))
            ThreePointArc((7.680574112, -15.28292057), (6.554010177, -18.006994968), (3.940010864, -16.644374252))
            Line((3.940010864, -16.644374252), (2.491260012, -11.213267971))
        make_face(mode=Mode.SUBTRACT)
    extrude(amount=BOSS_EXTRUDE5_DEPTH + BOSS_EXTRUDE5_DEPTH_BACK)


solid = part.part
